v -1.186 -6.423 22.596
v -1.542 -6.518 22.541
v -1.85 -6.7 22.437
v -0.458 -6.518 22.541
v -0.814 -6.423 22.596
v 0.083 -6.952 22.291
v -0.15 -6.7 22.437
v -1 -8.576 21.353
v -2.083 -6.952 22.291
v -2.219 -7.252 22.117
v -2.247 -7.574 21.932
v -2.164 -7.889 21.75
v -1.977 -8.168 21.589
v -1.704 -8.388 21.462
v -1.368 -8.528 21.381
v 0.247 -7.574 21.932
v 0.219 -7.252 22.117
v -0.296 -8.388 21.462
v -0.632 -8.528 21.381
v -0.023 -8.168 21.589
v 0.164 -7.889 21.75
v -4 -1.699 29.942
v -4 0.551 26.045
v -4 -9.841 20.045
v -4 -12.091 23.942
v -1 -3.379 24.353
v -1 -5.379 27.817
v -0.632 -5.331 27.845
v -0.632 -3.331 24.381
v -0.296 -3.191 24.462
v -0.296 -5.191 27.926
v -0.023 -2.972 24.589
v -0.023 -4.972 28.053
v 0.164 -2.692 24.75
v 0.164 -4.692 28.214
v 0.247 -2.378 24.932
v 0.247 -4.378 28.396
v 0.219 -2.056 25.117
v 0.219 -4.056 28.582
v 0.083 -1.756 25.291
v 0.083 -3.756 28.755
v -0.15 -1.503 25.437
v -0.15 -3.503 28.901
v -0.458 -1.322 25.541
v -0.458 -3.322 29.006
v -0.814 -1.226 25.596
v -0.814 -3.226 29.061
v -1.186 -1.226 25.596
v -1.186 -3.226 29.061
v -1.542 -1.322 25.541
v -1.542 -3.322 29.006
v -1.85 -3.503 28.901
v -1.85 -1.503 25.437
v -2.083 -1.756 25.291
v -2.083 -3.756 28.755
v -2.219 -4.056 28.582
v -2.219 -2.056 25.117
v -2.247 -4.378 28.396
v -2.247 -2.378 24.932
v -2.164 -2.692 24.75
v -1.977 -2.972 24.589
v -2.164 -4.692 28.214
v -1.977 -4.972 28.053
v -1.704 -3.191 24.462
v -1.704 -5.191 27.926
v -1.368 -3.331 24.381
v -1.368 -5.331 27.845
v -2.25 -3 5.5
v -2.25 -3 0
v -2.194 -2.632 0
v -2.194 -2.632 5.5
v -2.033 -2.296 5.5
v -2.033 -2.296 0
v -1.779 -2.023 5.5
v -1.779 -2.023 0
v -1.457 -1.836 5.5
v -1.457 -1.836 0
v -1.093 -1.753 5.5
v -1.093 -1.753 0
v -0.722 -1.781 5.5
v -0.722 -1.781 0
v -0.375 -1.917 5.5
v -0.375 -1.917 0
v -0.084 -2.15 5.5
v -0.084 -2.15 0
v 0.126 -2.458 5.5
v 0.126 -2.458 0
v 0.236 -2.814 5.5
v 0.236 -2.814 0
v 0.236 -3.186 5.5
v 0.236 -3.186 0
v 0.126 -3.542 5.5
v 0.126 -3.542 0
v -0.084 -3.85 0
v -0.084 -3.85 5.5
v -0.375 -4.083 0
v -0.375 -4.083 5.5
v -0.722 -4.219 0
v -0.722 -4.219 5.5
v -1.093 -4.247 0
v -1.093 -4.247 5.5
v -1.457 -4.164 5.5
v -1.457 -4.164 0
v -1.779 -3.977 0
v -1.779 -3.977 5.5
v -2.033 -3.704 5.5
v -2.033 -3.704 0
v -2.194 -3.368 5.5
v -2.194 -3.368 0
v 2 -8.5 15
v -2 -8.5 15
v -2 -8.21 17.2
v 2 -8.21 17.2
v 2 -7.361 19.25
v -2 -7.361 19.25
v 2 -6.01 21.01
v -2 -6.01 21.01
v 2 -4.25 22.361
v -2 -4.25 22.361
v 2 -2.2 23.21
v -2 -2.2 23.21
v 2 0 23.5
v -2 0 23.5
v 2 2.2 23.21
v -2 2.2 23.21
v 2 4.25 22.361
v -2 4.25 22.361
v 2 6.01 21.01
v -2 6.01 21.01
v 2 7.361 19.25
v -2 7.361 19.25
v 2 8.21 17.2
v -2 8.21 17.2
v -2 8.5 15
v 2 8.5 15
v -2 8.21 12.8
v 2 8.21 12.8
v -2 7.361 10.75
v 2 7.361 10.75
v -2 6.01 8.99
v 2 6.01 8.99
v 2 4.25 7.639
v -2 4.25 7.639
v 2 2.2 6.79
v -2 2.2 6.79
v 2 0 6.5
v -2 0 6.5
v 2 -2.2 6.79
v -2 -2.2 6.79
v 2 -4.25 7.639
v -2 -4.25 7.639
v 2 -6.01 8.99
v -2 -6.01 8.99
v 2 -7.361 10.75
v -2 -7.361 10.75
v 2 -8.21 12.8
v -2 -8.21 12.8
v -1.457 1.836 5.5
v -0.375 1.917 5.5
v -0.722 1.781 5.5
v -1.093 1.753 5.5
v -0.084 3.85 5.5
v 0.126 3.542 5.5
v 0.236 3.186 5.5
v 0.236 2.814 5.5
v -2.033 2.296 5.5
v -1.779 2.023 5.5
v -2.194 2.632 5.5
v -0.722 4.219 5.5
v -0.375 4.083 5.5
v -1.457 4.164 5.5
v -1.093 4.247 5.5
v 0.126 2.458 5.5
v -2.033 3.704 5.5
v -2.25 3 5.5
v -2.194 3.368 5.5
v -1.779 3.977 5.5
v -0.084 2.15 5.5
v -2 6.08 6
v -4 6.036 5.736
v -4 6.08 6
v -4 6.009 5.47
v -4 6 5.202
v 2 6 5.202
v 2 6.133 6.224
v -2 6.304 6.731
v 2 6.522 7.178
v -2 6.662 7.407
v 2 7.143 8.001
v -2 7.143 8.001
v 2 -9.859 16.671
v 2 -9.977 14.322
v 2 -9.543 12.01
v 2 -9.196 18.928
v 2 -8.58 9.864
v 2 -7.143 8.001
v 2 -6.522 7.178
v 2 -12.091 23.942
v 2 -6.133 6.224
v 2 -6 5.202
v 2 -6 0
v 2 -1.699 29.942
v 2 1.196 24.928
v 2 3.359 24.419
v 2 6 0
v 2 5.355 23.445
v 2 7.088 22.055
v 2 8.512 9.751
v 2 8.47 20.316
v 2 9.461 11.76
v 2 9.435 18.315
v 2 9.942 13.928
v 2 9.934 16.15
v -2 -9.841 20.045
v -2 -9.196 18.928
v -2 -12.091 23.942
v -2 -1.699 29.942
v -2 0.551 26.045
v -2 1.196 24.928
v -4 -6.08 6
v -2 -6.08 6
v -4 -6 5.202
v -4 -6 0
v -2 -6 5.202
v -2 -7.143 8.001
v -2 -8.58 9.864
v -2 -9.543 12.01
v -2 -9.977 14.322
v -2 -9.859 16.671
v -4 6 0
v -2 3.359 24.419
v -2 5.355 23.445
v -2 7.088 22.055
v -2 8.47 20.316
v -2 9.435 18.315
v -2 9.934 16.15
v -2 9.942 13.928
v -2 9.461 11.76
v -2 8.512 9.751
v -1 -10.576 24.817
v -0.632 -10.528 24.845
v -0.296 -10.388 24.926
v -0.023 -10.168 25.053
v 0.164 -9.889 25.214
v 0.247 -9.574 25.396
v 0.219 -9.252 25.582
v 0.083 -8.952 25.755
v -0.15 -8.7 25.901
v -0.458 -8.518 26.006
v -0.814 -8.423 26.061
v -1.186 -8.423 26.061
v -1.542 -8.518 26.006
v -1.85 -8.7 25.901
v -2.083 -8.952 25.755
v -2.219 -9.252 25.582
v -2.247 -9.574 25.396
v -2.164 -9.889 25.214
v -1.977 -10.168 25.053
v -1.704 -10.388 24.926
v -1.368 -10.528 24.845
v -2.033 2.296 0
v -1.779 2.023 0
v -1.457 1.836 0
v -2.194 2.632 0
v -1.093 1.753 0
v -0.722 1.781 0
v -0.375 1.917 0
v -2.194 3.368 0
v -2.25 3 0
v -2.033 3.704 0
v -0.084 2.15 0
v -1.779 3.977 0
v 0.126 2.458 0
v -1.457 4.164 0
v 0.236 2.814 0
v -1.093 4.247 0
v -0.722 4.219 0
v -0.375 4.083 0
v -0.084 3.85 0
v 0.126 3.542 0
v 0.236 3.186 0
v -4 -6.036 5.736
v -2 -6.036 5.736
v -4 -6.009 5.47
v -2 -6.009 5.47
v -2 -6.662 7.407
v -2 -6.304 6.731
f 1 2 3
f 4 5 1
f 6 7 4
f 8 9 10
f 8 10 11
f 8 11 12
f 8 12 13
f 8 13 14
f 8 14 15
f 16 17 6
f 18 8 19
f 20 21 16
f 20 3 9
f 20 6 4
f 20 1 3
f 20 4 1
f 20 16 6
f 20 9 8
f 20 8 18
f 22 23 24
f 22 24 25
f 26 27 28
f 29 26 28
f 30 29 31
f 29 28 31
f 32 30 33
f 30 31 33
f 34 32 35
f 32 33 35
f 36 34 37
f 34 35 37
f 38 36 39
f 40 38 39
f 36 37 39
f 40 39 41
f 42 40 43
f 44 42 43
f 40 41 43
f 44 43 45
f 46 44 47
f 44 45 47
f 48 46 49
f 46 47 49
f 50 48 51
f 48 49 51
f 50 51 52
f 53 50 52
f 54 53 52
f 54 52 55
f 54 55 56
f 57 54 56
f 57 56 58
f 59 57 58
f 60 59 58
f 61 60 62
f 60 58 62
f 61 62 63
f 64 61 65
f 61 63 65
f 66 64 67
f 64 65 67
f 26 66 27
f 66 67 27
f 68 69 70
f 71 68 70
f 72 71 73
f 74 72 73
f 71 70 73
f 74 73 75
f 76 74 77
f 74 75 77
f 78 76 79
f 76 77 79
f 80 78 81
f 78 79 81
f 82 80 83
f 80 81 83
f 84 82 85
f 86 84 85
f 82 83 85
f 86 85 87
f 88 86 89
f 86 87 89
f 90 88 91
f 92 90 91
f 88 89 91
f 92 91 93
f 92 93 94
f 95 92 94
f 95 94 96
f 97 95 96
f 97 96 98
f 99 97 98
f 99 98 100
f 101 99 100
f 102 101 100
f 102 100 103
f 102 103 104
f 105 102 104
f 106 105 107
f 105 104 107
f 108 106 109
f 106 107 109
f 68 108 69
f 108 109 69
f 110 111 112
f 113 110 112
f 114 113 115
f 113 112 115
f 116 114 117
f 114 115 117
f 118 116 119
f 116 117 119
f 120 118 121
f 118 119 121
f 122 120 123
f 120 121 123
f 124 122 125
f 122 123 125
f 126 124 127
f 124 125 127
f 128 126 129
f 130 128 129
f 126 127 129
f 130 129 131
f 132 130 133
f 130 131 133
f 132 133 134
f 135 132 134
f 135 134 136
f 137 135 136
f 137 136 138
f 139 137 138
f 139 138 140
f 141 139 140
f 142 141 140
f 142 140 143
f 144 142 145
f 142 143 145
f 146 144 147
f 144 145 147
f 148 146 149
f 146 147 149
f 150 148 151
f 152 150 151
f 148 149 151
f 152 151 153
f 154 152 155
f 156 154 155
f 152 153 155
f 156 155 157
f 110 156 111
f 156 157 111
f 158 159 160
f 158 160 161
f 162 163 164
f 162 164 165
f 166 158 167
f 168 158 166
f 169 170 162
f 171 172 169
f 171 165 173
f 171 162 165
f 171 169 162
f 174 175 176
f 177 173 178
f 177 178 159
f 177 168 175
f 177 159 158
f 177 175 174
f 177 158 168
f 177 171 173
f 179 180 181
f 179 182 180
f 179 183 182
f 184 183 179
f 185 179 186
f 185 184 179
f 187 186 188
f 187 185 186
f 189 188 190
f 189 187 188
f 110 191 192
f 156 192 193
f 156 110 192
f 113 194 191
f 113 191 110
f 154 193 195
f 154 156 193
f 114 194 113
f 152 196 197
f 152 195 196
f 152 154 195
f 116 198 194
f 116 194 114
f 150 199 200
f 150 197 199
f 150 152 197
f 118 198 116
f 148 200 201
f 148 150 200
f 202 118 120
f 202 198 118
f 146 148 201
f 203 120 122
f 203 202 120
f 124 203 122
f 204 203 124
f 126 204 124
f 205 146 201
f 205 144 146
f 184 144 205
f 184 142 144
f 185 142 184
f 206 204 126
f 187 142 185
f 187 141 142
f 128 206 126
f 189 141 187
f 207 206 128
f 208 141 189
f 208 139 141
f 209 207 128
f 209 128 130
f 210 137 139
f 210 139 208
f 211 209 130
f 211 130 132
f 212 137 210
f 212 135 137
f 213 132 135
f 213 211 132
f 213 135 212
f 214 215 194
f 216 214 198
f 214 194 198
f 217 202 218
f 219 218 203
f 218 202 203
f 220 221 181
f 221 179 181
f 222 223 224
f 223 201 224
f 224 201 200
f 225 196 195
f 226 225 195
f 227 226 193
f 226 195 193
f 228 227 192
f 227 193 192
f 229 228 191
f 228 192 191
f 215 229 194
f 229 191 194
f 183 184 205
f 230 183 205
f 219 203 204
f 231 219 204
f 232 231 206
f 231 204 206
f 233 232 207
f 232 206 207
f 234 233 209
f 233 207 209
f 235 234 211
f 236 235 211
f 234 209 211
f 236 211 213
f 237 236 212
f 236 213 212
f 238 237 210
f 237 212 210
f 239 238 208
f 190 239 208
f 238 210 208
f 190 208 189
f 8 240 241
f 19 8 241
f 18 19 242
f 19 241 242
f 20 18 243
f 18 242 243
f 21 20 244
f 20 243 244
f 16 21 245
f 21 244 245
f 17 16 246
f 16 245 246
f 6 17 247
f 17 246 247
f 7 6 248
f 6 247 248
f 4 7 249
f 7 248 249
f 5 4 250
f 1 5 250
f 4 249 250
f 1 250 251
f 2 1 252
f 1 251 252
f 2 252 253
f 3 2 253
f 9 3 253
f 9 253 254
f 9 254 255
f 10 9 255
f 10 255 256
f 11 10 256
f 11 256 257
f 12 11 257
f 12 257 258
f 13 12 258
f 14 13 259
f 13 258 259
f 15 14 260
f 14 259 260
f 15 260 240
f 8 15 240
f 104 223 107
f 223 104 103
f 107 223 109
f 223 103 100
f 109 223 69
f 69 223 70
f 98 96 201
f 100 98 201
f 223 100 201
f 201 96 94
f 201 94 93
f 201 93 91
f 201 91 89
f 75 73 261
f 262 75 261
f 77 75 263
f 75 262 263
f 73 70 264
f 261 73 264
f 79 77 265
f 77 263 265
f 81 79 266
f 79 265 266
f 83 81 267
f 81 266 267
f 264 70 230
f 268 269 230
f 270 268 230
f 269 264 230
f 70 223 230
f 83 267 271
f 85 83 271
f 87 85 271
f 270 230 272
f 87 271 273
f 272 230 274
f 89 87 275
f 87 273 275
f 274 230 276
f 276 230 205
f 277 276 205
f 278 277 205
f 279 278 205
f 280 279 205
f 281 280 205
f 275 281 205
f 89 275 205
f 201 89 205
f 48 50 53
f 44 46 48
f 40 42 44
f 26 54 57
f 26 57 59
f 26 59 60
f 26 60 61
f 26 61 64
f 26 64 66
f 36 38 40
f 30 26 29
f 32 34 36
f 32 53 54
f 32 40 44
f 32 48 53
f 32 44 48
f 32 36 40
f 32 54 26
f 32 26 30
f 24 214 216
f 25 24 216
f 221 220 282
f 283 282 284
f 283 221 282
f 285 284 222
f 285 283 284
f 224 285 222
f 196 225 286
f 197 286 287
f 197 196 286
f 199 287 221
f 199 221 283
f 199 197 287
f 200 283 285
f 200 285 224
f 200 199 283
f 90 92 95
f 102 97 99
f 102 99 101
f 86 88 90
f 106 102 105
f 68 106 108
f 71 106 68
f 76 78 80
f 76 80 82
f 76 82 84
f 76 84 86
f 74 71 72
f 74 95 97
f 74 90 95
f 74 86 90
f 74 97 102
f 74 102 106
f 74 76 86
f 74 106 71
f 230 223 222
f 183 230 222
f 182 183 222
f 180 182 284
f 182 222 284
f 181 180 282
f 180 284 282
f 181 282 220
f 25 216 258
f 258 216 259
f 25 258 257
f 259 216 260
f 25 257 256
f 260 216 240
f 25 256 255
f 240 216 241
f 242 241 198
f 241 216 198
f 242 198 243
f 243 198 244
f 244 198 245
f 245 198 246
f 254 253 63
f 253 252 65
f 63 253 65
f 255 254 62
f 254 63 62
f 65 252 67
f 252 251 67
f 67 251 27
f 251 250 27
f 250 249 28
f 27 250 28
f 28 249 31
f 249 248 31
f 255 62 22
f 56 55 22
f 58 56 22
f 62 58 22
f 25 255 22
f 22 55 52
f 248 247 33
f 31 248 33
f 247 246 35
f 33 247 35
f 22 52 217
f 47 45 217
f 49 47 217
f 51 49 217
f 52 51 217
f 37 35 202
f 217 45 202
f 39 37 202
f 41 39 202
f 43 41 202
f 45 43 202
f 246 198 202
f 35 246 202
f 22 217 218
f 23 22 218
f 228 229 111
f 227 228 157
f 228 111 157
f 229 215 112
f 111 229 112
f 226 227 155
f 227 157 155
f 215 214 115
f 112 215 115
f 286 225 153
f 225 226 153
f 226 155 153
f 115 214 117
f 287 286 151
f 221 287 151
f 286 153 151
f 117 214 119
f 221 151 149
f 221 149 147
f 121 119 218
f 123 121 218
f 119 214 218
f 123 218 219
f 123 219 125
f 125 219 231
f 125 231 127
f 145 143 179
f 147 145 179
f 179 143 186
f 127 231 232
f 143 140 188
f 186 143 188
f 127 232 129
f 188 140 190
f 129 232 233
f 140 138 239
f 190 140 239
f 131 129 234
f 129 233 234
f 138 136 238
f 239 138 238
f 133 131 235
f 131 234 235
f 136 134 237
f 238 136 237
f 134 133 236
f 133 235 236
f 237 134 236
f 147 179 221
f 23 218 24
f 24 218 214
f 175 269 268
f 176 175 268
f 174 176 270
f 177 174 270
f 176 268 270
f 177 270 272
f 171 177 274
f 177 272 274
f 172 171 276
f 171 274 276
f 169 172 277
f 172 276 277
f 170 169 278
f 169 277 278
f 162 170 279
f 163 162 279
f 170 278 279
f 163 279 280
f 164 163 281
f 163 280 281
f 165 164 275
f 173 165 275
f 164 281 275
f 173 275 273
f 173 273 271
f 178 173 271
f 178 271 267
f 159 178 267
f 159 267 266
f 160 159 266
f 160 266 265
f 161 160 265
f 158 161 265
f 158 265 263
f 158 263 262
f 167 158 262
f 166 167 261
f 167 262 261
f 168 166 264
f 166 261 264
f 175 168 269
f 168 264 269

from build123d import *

# Parameters (mm, degrees)
SKETCH1_W       = 6
SKETCH1_H       = 12
EXTRUDE1_DEPTH  = 6
SKETCH3_W       = 4
SKETCH3_H       = 8.6
EXTRUDE2_DEPTH  = 1
SKETCH2_R       = 1.25
EXTRUDE3_DEPTH  = 5.5
EXTRUDE4_DEPTH  = 4
SKETCH6_R       = 8.5
EXTRUDE5_DEPTH  = 4
FILLET1_R       = 4
EXTRUDE9_START  = -4
EXTRUDE9_DEPTH  = 4
EXTRUDE10_DEPTH = 2
SKETCH14_R      = 1.25
EXTRUDE11_DEPTH = 4


with BuildPart() as part:
    # Sketch1 → Extrude1 (new body)
    with BuildSketch(Plane.XY):
        with Locations((-1, 0)):
            Rectangle(SKETCH1_W, SKETCH1_H)
    extrude(amount=EXTRUDE1_DEPTH)

    # Sketch3 → Extrude2 (add)
    with BuildSketch(Plane.XY.offset(6)):
        Rectangle(SKETCH3_W, SKETCH3_H)
    extrude(amount=EXTRUDE2_DEPTH)

    # Sketch2 → Extrude3 (cut)
    with BuildSketch(Plane(origin=(0, 0, 0), x_dir=(-1, 0, 0), z_dir=(0, 0, -1))):
        with Locations((1, 3)):
            Circle(SKETCH2_R)
        with Locations((1, -3)):
            Circle(SKETCH2_R)
    extrude(amount=-EXTRUDE3_DEPTH, mode=Mode.SUBTRACT)

    # Sketch4 → Extrude4 (add)
    with BuildSketch(Plane(origin=(2, 0, 0), x_dir=(0, 0, -1), z_dir=(1, 0, 0))):
        with BuildLine():
            Line((-7, 6), (-6, 6))
            Line((-6, 6), (-6, -6))
            Line((-6, -6), (-7, -6))
            ThreePointArc((-7, -6), (-25, 0), (-7, 6))
        make_face()
    extrude(amount=-EXTRUDE4_DEPTH)

    # Sketch6 → Extrude5 (cut)
    with BuildSketch(Plane.ZY.offset(2)):
        with Locations(Location((15, 0, 0), (0, 0, 270))):
            Circle(SKETCH6_R)
    extrude(amount=-EXTRUDE5_DEPTH, mode=Mode.SUBTRACT)

    # Fillet1
    # the kernel refuses this fillet: 4 mm, written as the material it adds along each edge
    with BuildSketch(Plane(origin=(2, 6, 7), x_dir=(0, 0, -1), z_dir=(-1, 0, 0))) as fillet1_piece_1_section:
        with BuildLine():
            CenterArc((1.797958971, -4), FILLET1_R, 90, 44.415308597)
            ThreePointArc((-1.001457878, -1.142857143), (-0.478989625, -0.590478203), (0, 0))
            Line((0, 0), (1.797958971, 0))
        make_face()
    fillet1_piece_1 = extrude(amount=4, mode=Mode.PRIVATE)
    fillet1_piece_1 = split(fillet1_piece_1, bisect_by=Plane(origin=(0, 5.976030652, 6), z_dir=(0, 0, -1)), keep=Keep.TOP, mode=Mode.PRIVATE)
    add(fillet1_piece_1)
    with BuildSketch(Plane(origin=(2, 6, 7), x_dir=(0, 0, -1), z_dir=(-1, 0, 0))) as fillet1_piece_2_section:
        with BuildLine():
            CenterArc((1.797958971, -4), FILLET1_R, 90, 44.415308597)
            ThreePointArc((-1.001457878, -1.142857143), (-0.478989625, -0.590478203), (0, 0))
            Line((0, 0), (1.797958971, 0))
        make_face()
    fillet1_piece_2 = extrude(amount=4, mode=Mode.PRIVATE)
    fillet1_piece_2 = split(fillet1_piece_2, bisect_by=Plane(origin=(0, 6.277319808, 6), z_dir=(0, 0, 1)), keep=Keep.TOP, mode=Mode.PRIVATE)
    add(fillet1_piece_2)
    with BuildSketch(Plane(origin=(2, 6, 7), x_dir=(0, 0, -1), z_dir=(-1, 0, 0))) as fillet1_piece_3_section:
        with BuildLine():
            CenterArc((1.797958971, -4), FILLET1_R, 90, 44.415308597)
            ThreePointArc((-1.001457878, -1.142857143), (-0.478989625, -0.590478203), (0, 0))
            Line((0, 0), (1.797958971, 0))
        make_face()
    fillet1_piece_3 = extrude(amount=8.494897428, mode=Mode.PRIVATE)
    fillet1_piece_3 = split(fillet1_piece_3, bisect_by=Plane(origin=(-4, 5.976030652, 5.651028554), z_dir=(1, 0, 0)), keep=Keep.TOP, mode=Mode.PRIVATE)
    fillet1_piece_3 = split(fillet1_piece_3, bisect_by=Plane(origin=(-3, 5.976030652, 6), z_dir=(0, 0, -1)), keep=Keep.TOP, mode=Mode.PRIVATE)
    fillet1_piece_3 = split(fillet1_piece_3, bisect_by=Plane(origin=(-2, 5.976030652, 5.651028554), z_dir=(-1, 0, 0)), keep=Keep.TOP, mode=Mode.PRIVATE)
    add(fillet1_piece_3)
    with BuildSketch(Plane(origin=(2, -6, 7), x_dir=(0, -0.7521010374968901, 0.6590478202650409), z_dir=(-1, 0, 0))) as fillet1_piece_4_section:
        with BuildLine():
            CenterArc((1.823463209, -3.988438089), FILLET1_R, 94.357396878, 44.415308597)
            Line((-1.184940941, -1.352246808), (0, 0))
            ThreePointArc((0, 0), (0.759776337, -0.028904778), (1.519552674, 0))
        make_face()
    fillet1_piece_4 = extrude(amount=4, mode=Mode.PRIVATE)
    fillet1_piece_4 = split(fillet1_piece_4, bisect_by=Plane(origin=(0, -6.277319808, 6), z_dir=(0, 0, 1)), keep=Keep.TOP, mode=Mode.PRIVATE)
    add(fillet1_piece_4)
    with BuildSketch(Plane(origin=(2, -6, 7), x_dir=(0, -0.7521010374968901, 0.6590478202650409), z_dir=(-1, 0, 0))) as fillet1_piece_5_section:
        with BuildLine():
            CenterArc((1.823463209, -3.988438089), FILLET1_R, 94.357396878, 44.415308597)
            Line((-1.184940941, -1.352246808), (0, 0))
            ThreePointArc((0, 0), (0.759776337, -0.028904778), (1.519552674, 0))
        make_face()
    fillet1_piece_5 = extrude(amount=4, mode=Mode.PRIVATE)
    fillet1_piece_5 = split(fillet1_piece_5, bisect_by=Plane(origin=(0, -5.976030652, 6), z_dir=(0, 0, -1)), keep=Keep.TOP, mode=Mode.PRIVATE)
    add(fillet1_piece_5)
    with BuildSketch(Plane(origin=(2, -6, 7), x_dir=(0, -0.7521010374968901, 0.6590478202650409), z_dir=(-1, 0, 0))) as fillet1_piece_6_section:
        with BuildLine():
            CenterArc((1.823463209, -3.988438089), FILLET1_R, 94.357396878, 44.415308597)
            Line((-1.184940941, -1.352246808), (0, 0))
            ThreePointArc((0, 0), (0.759776337, -0.028904778), (1.519552674, 0))
        make_face()
    fillet1_piece_6 = extrude(amount=8.494897428, mode=Mode.PRIVATE)
    fillet1_piece_6 = split(fillet1_piece_6, bisect_by=Plane(origin=(-4, -5.976030652, 5.651028554), z_dir=(1, 0, 0)), keep=Keep.TOP, mode=Mode.PRIVATE)
    fillet1_piece_6 = split(fillet1_piece_6, bisect_by=Plane(origin=(-3, -5.976030652, 6), z_dir=(0, 0, -1)), keep=Keep.TOP, mode=Mode.PRIVATE)
    fillet1_piece_6 = split(fillet1_piece_6, bisect_by=Plane(origin=(-2, -5.976030652, 5.651028554), z_dir=(-1, 0, 0)), keep=Keep.TOP, mode=Mode.PRIVATE)
    add(fillet1_piece_6)

    # Sketch12 → Extrude9 (add)
    with BuildSketch(Plane.ZY.offset(2).offset(EXTRUDE9_START)):
        with BuildLine():
            Line((18.92820323, -9.196152423), (23.942490318, -12.091152423))
            Line((23.942490318, -12.091152423), (29.942490318, -1.698847577))
            Line((29.942490318, -1.698847577), (24.92820323, 1.196152423))
            ThreePointArc((24.92820323, 1.196152423), (23.660254038, -5), (18.92820323, -9.196152423))
        make_face()
    extrude(amount=EXTRUDE9_DEPTH)

    # Sketch13 → Extrude10 (add)
    with BuildSketch(Plane.ZY.offset(2)):
        Polygon((29.942490318, -1.698847577), (26.045376001, 0.551152423), (20.045376001, -9.841152423), (23.942490318, -12.091152423), align=None)
    extrude(amount=EXTRUDE10_DEPTH)

    # Sketch14 → Extrude11 (cut)
    with BuildSketch(Plane(origin=(0, -13.390190528, 23.192490318), x_dir=(1, 0, 0), z_dir=(0, -0.5000000000000007, 0.8660254037844383))):
        with Locations(Location((-1, 4.5, 0), (0, 0, 270))):
            Circle(SKETCH14_R)
        with Locations(Location((-1, 10.5, 0), (0, 0, 270))):
            Circle(SKETCH14_R)
    extrude(amount=-EXTRUDE11_DEPTH, mode=Mode.SUBTRACT)


solid = part.part
